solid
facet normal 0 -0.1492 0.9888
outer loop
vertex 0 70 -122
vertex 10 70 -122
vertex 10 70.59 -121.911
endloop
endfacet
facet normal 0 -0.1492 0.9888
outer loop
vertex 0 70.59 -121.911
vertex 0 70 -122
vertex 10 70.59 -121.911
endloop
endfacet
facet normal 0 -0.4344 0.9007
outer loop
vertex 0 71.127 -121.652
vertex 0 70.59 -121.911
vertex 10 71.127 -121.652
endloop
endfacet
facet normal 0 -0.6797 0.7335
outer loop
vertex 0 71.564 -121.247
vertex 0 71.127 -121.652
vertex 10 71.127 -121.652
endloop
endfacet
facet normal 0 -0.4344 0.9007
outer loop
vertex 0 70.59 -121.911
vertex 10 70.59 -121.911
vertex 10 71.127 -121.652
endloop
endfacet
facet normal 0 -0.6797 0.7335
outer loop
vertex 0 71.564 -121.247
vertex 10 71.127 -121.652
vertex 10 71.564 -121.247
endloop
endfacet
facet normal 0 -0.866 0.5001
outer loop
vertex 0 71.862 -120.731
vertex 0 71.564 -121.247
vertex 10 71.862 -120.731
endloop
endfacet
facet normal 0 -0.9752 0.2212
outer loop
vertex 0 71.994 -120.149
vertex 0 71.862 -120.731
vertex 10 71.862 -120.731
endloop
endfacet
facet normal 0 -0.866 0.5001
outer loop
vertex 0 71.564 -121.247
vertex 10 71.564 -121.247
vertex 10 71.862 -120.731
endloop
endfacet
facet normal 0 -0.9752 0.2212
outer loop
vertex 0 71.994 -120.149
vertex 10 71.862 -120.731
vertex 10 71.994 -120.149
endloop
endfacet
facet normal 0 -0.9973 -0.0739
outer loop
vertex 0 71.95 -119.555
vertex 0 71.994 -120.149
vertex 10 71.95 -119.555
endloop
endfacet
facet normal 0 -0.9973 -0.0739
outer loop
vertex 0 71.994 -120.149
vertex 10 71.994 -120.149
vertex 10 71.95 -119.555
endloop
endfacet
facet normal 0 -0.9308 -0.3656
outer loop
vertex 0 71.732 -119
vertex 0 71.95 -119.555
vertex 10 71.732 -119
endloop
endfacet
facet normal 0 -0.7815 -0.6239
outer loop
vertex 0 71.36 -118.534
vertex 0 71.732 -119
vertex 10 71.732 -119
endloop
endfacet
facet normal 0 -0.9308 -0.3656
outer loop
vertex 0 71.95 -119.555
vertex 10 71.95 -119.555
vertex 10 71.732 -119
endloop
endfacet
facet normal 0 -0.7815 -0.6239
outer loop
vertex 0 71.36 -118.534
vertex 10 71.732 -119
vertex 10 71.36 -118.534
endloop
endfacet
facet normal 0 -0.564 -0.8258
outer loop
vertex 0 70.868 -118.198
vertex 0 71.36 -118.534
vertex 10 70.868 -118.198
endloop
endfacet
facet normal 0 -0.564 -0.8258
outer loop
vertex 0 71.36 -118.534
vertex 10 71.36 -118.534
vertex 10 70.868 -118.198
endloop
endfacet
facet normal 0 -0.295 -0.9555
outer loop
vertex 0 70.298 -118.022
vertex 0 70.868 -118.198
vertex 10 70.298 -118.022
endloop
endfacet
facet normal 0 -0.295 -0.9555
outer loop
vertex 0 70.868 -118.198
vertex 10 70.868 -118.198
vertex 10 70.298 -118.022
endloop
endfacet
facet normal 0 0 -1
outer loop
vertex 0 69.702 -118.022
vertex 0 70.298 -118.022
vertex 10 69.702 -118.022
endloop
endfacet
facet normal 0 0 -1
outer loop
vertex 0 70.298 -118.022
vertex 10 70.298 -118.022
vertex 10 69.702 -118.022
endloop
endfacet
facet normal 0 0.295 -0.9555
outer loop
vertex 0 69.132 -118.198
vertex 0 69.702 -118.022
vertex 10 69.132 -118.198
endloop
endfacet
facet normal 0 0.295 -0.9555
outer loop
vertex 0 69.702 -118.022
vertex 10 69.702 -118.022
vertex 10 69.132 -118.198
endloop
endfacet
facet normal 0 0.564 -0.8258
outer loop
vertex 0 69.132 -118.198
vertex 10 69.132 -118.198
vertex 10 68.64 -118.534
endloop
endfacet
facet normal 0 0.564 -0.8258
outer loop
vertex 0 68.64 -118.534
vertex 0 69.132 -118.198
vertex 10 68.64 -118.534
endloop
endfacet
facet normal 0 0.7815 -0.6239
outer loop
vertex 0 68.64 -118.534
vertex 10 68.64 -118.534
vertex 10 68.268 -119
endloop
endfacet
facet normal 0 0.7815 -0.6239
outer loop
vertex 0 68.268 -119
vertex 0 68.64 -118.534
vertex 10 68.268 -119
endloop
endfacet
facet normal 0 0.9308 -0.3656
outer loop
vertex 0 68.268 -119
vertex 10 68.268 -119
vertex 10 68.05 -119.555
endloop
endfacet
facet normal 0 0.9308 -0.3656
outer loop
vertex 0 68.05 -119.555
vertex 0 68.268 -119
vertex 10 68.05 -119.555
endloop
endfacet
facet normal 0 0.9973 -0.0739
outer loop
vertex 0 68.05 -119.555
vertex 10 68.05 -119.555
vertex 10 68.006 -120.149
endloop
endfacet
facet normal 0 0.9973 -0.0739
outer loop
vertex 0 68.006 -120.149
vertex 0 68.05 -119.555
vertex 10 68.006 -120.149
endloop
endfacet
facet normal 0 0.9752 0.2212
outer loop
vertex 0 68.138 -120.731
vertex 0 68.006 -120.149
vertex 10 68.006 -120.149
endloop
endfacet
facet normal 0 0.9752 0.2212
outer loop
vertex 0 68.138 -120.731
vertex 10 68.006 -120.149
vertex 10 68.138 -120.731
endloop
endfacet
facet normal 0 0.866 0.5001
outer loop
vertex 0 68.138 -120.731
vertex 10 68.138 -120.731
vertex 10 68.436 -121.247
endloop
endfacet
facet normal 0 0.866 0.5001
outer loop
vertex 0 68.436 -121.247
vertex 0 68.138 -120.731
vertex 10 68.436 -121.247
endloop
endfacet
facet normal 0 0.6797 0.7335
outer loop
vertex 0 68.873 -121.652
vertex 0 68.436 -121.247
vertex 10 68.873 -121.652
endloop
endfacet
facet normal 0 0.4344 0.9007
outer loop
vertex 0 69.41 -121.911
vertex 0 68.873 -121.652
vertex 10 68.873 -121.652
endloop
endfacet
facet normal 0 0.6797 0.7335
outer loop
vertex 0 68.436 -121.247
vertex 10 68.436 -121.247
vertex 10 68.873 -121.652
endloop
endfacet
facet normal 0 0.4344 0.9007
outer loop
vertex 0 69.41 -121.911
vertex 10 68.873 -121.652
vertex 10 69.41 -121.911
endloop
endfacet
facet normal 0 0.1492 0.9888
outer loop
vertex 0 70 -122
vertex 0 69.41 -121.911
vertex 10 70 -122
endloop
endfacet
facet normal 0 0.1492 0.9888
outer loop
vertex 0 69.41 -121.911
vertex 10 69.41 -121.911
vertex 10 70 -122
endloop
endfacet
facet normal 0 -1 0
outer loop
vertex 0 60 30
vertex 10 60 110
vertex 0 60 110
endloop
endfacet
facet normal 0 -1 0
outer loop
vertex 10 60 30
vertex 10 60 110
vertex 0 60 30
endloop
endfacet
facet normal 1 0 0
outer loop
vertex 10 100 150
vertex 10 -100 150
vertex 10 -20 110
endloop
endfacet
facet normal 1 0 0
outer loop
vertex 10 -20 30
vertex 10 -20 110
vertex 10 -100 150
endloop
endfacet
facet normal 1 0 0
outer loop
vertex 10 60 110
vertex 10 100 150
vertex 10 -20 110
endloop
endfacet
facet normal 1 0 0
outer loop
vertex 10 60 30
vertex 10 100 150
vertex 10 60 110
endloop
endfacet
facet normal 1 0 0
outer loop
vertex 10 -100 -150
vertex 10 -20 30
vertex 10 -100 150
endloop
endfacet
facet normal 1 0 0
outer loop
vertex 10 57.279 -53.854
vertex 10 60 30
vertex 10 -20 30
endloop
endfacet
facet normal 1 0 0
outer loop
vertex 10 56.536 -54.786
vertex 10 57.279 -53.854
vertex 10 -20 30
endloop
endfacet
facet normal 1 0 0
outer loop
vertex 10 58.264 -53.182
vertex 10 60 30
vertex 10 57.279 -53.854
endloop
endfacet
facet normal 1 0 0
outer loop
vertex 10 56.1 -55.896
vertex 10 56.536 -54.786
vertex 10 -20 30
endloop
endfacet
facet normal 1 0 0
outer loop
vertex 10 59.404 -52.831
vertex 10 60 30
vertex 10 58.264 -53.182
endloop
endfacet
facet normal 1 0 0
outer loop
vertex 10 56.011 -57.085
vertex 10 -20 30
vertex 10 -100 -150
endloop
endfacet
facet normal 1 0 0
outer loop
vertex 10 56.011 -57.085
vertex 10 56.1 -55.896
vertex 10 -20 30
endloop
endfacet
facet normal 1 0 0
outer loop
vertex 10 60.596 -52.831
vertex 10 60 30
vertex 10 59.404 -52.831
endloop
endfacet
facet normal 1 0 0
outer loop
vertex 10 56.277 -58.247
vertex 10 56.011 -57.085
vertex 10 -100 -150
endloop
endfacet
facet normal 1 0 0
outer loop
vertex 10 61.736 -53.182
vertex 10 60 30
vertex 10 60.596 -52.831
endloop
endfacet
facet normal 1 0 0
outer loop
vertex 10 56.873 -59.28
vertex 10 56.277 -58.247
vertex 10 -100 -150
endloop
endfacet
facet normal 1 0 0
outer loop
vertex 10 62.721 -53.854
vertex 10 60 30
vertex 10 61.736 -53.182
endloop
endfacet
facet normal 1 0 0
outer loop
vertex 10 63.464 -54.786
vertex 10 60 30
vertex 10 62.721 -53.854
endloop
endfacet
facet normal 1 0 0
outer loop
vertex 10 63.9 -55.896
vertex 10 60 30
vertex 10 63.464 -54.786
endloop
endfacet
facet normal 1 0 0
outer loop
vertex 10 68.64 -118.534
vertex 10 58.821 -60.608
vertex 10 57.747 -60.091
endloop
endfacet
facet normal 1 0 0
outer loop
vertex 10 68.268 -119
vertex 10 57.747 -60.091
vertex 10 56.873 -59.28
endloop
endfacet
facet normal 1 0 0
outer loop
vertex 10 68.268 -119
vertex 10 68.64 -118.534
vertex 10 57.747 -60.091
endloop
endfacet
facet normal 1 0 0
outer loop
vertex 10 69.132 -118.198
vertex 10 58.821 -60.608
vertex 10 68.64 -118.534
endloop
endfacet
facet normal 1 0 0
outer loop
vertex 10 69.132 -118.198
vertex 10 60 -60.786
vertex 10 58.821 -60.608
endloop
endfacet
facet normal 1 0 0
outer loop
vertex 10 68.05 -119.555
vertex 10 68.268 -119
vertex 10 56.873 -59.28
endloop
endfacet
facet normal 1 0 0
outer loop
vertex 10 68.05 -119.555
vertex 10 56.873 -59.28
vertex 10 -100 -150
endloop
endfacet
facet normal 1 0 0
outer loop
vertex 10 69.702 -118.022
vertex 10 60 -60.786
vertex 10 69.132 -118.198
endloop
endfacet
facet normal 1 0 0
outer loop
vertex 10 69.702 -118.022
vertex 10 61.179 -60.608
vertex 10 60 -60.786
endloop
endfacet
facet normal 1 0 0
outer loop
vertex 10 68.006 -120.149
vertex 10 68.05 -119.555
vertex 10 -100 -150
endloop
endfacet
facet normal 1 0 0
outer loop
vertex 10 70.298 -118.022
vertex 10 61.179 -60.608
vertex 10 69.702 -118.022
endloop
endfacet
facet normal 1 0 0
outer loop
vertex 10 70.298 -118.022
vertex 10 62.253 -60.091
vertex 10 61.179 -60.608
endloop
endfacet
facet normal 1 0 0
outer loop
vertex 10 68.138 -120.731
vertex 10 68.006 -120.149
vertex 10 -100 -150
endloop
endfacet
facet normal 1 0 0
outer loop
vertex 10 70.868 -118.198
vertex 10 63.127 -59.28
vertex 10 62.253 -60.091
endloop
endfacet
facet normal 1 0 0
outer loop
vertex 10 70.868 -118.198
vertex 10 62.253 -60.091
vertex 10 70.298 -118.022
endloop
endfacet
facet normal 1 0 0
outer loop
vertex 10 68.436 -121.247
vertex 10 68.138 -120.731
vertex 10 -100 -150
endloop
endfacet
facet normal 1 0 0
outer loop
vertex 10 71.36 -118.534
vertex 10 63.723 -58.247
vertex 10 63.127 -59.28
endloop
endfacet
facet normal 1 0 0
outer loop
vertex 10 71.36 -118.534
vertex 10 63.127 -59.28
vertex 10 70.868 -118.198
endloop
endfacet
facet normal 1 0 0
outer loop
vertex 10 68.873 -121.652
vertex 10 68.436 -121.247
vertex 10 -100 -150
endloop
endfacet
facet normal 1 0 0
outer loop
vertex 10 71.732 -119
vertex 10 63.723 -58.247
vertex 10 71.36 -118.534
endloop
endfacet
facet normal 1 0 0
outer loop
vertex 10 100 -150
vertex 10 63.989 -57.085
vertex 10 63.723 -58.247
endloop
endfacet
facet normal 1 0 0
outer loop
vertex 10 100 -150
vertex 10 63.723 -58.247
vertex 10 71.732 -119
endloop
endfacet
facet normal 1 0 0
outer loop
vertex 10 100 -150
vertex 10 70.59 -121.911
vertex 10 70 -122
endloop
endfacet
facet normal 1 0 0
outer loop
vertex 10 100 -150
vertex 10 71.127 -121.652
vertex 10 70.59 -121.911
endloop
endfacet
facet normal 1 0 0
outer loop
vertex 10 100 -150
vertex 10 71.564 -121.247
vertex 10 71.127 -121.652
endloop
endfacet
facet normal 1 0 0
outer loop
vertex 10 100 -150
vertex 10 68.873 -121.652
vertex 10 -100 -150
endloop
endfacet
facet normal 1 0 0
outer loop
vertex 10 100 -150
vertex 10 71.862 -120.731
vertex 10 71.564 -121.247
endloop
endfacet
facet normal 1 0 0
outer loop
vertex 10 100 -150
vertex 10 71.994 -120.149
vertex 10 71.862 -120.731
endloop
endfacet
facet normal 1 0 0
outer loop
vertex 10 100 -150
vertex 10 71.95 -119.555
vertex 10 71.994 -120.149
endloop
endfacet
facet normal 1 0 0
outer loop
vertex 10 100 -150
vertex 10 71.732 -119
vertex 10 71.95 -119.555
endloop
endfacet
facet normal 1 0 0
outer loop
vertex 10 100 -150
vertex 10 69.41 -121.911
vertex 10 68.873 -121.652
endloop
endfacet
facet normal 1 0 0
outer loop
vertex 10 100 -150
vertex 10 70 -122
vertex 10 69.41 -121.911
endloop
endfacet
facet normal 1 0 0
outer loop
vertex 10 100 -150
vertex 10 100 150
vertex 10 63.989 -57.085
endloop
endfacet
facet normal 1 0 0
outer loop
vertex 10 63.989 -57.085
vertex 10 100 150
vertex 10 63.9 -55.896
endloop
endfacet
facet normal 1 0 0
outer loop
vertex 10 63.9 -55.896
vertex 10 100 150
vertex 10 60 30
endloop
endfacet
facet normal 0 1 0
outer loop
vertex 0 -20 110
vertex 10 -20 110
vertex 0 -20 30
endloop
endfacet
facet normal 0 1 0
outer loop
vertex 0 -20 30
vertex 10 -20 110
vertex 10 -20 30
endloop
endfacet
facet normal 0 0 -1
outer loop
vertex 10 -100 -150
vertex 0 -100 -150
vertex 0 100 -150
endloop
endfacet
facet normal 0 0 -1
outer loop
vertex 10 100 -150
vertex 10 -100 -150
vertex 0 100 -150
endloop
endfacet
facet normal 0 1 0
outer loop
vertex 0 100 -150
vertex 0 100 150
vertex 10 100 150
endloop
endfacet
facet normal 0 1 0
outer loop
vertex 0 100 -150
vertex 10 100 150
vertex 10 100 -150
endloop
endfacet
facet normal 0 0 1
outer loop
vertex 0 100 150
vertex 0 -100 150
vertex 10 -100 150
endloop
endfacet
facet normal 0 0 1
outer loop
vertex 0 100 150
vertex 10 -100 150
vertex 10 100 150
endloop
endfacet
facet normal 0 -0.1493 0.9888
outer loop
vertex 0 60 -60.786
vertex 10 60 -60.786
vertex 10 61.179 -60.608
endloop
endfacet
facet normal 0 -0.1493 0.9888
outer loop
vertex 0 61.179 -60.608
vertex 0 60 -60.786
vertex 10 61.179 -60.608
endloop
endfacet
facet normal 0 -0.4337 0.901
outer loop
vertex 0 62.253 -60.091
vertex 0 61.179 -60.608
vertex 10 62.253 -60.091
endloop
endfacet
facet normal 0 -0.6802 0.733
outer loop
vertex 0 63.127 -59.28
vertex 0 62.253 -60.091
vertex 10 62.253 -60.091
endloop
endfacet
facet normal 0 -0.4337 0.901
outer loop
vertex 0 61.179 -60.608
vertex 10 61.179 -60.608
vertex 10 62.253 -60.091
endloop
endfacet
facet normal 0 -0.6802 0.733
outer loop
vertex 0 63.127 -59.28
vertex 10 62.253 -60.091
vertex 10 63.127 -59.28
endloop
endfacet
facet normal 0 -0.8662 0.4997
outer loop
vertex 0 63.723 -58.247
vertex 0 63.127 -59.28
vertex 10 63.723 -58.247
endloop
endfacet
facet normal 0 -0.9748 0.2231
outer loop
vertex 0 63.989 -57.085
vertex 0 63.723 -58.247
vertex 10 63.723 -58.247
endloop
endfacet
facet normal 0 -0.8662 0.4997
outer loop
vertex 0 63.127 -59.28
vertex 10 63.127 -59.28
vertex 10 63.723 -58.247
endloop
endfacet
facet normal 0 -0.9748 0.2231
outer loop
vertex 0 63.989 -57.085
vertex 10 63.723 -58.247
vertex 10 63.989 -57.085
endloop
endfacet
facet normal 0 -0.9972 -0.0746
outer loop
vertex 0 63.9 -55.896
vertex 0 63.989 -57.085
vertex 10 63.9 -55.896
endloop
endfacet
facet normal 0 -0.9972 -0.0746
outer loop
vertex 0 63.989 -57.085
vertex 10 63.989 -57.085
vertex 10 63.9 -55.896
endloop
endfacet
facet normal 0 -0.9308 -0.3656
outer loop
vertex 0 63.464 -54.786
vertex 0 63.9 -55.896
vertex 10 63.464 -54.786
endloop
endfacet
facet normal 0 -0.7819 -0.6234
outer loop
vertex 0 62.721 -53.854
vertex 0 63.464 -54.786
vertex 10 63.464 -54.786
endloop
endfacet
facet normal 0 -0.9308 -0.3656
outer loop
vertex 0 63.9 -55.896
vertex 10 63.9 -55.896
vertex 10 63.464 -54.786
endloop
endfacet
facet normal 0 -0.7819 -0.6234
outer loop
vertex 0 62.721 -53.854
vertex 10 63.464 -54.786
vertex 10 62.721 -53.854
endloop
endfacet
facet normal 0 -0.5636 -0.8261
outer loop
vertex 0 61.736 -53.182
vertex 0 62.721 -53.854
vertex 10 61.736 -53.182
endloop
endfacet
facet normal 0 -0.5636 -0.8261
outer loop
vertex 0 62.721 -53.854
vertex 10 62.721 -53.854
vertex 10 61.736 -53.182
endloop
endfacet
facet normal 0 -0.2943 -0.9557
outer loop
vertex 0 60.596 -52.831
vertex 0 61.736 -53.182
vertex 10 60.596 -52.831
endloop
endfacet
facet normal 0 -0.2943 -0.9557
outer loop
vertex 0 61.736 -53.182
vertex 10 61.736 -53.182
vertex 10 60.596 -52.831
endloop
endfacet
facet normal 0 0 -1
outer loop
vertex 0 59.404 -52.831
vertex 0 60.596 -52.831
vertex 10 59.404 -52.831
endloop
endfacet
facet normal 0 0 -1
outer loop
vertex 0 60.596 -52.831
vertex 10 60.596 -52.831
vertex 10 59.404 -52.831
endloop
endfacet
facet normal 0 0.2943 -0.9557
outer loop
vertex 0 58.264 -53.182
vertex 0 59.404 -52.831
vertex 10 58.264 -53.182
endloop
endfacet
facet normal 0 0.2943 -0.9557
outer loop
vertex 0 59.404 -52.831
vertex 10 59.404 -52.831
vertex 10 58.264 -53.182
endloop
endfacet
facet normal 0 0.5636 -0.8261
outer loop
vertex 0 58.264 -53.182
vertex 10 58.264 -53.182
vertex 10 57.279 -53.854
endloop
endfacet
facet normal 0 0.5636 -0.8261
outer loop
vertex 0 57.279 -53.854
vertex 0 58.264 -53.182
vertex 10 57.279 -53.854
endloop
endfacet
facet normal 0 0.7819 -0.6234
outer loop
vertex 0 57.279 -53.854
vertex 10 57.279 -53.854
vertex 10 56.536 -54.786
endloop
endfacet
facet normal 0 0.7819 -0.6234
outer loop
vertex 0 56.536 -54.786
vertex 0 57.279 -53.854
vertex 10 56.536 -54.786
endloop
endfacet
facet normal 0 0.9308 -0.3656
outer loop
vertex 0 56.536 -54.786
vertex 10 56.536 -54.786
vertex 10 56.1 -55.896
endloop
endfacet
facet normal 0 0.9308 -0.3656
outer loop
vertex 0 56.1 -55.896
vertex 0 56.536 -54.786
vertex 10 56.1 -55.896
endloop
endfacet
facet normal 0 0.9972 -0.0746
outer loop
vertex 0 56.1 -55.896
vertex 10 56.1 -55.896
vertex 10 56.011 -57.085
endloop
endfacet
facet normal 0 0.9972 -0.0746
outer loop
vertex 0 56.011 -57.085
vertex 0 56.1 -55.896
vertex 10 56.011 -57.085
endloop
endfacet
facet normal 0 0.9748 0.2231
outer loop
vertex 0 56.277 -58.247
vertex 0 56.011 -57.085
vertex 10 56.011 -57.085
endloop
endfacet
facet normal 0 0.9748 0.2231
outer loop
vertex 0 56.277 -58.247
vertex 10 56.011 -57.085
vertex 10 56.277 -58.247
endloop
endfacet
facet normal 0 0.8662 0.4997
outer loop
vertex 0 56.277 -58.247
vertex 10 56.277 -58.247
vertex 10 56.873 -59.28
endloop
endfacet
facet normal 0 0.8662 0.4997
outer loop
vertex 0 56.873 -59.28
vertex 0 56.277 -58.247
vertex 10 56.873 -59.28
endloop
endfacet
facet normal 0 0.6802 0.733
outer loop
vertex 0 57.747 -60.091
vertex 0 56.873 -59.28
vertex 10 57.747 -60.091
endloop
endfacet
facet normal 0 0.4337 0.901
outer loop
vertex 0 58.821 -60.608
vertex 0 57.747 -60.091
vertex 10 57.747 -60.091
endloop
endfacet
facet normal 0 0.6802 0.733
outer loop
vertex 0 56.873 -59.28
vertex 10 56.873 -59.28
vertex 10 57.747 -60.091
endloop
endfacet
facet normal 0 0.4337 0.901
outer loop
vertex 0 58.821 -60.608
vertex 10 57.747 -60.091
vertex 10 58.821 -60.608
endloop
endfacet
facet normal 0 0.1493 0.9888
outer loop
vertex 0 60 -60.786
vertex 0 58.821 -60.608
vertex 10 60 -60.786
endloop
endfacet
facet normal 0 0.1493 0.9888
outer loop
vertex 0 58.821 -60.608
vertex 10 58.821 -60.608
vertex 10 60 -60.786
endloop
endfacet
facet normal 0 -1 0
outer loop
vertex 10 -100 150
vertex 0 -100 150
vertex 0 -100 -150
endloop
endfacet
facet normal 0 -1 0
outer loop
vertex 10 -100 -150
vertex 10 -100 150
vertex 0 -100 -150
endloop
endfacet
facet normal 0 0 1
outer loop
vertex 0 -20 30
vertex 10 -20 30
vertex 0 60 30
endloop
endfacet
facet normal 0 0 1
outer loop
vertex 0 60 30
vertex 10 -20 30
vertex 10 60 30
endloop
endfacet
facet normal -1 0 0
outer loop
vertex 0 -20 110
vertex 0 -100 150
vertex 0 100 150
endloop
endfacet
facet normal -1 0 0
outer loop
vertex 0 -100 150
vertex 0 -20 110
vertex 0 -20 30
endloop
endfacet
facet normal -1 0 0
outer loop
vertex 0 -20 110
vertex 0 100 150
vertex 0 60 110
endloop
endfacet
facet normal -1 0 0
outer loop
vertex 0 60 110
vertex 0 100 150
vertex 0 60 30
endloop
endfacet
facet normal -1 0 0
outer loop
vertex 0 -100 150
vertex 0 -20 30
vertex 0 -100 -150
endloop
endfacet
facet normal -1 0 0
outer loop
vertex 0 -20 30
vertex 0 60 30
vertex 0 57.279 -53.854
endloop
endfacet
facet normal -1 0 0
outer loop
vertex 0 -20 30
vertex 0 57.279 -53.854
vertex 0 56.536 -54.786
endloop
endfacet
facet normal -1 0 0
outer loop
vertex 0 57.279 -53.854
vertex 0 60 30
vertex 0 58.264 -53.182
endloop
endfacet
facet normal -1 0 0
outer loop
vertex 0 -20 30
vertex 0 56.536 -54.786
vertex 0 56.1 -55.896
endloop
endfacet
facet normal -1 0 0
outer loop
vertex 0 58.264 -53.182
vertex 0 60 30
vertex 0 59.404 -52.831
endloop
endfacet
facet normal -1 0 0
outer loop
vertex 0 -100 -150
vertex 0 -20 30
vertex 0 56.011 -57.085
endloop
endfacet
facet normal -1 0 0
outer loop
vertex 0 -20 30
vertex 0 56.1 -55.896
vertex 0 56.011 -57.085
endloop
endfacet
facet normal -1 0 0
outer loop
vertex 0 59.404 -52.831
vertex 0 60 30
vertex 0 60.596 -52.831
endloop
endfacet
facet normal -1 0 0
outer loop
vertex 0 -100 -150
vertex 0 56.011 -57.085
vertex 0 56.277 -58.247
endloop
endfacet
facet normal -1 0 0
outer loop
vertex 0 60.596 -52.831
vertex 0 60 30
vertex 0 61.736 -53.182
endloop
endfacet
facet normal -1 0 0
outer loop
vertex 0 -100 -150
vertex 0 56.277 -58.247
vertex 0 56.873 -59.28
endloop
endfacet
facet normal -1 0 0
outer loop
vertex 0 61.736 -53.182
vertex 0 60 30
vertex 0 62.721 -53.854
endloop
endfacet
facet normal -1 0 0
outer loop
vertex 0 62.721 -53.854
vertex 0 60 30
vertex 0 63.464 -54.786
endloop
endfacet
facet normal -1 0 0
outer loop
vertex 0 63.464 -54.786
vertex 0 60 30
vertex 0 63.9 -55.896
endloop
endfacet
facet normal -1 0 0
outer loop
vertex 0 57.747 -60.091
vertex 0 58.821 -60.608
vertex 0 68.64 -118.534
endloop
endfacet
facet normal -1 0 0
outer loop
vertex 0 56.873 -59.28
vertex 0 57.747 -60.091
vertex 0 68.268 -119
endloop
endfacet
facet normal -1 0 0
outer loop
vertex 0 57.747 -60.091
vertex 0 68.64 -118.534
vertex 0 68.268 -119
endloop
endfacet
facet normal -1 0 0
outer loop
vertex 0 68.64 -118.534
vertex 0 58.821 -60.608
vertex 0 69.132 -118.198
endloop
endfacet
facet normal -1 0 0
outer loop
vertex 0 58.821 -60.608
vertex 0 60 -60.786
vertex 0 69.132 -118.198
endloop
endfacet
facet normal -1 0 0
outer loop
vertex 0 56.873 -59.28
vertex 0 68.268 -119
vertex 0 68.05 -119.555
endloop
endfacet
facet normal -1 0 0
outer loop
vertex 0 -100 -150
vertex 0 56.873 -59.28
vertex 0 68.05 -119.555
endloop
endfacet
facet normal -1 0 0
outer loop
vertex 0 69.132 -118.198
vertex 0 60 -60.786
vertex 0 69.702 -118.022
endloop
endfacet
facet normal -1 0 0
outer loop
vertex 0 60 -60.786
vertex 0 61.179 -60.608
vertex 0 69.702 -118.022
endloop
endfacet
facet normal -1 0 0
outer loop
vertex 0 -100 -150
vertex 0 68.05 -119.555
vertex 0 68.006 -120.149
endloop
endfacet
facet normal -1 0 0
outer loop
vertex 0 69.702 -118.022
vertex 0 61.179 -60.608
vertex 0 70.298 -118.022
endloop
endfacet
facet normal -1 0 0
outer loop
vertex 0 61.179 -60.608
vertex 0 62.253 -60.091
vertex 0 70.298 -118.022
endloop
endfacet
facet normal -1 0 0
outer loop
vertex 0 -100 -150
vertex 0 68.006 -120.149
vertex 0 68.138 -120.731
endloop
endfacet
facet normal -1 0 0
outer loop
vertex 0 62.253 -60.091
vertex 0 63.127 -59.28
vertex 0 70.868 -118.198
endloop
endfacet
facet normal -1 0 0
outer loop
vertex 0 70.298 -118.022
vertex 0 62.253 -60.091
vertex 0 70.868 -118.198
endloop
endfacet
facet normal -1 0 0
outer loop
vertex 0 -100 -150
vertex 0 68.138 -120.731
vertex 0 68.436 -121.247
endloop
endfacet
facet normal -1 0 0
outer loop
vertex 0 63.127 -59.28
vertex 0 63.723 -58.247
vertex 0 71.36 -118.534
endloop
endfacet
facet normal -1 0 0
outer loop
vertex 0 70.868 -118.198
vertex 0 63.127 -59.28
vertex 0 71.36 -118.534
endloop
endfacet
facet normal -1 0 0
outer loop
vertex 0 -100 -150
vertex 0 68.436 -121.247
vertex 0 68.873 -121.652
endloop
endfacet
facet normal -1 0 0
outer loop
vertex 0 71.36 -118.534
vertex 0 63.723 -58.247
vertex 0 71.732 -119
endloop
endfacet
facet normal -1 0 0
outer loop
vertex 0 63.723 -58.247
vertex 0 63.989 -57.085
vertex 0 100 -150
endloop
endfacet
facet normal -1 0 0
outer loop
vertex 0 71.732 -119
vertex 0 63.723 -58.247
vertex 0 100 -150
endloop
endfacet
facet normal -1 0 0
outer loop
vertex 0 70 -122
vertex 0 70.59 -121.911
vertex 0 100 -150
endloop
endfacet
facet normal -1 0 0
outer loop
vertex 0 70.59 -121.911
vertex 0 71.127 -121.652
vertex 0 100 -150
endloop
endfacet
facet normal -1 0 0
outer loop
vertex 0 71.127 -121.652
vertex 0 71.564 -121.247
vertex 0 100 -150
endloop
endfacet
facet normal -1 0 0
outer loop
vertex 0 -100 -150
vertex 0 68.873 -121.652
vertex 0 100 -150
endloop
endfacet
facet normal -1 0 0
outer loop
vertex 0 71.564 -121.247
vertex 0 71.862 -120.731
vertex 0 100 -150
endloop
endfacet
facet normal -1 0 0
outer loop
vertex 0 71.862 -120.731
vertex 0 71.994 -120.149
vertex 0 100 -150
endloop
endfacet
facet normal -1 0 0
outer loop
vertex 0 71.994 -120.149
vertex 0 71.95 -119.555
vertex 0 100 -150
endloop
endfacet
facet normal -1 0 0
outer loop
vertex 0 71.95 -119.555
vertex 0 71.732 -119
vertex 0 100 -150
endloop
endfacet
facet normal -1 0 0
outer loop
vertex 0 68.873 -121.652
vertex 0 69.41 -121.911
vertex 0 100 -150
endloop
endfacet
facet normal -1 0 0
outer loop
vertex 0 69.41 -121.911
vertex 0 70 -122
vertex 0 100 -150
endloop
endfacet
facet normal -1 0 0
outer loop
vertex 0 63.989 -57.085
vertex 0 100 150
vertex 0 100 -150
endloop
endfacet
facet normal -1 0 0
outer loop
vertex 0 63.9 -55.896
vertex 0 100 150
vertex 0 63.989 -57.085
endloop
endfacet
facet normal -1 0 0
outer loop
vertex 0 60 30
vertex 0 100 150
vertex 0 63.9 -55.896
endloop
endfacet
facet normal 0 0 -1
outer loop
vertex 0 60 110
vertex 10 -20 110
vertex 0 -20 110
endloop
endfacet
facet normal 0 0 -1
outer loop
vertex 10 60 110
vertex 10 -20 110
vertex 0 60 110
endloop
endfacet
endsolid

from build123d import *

# Parameters (mm, degrees)
SKETCH1_W           = 300
SKETCH1_H           = 200
BOSS_EXTRUDE1_DEPTH = 10
SKETCH2_R           = 2
SKETCH2_R_2         = 4
CUT_EXTRUDE1_DEPTH  = 10
SKETCH3_W           = 80
SKETCH3_H           = 80
CUT_EXTRUDE2_DEPTH  = 10


with BuildPart() as part:
    # Sketch1 → Boss-Extrude1 (new body)
    with BuildSketch(Plane(origin=(0, 0, 0), x_dir=(0, 0, -1), z_dir=(1, 0, 0))):
        Rectangle(SKETCH1_W, SKETCH1_H)
    extrude(amount=BOSS_EXTRUDE1_DEPTH)

    # Sketch2 → Cut-Extrude1 (cut)
    with BuildSketch(Plane(origin=(10, 0, 0), x_dir=(0, 0, -1), z_dir=(1, 0, 0))):
        with Locations((120, 70)):
            Circle(SKETCH2_R)
        with Locations((56.786077483, 60)):
            Circle(SKETCH2_R_2)
    extrude(amount=-CUT_EXTRUDE1_DEPTH, mode=Mode.SUBTRACT)

    # Sketch3 → Cut-Extrude2 (cut)
    with BuildSketch(Plane(origin=(10, 0, 0), x_dir=(0, 0, -1), z_dir=(1, 0, 0))):
        with Locations((-70, 20)):
            Rectangle(SKETCH3_W, SKETCH3_H)
    extrude(amount=-CUT_EXTRUDE2_DEPTH, mode=Mode.SUBTRACT)


solid = part.part
